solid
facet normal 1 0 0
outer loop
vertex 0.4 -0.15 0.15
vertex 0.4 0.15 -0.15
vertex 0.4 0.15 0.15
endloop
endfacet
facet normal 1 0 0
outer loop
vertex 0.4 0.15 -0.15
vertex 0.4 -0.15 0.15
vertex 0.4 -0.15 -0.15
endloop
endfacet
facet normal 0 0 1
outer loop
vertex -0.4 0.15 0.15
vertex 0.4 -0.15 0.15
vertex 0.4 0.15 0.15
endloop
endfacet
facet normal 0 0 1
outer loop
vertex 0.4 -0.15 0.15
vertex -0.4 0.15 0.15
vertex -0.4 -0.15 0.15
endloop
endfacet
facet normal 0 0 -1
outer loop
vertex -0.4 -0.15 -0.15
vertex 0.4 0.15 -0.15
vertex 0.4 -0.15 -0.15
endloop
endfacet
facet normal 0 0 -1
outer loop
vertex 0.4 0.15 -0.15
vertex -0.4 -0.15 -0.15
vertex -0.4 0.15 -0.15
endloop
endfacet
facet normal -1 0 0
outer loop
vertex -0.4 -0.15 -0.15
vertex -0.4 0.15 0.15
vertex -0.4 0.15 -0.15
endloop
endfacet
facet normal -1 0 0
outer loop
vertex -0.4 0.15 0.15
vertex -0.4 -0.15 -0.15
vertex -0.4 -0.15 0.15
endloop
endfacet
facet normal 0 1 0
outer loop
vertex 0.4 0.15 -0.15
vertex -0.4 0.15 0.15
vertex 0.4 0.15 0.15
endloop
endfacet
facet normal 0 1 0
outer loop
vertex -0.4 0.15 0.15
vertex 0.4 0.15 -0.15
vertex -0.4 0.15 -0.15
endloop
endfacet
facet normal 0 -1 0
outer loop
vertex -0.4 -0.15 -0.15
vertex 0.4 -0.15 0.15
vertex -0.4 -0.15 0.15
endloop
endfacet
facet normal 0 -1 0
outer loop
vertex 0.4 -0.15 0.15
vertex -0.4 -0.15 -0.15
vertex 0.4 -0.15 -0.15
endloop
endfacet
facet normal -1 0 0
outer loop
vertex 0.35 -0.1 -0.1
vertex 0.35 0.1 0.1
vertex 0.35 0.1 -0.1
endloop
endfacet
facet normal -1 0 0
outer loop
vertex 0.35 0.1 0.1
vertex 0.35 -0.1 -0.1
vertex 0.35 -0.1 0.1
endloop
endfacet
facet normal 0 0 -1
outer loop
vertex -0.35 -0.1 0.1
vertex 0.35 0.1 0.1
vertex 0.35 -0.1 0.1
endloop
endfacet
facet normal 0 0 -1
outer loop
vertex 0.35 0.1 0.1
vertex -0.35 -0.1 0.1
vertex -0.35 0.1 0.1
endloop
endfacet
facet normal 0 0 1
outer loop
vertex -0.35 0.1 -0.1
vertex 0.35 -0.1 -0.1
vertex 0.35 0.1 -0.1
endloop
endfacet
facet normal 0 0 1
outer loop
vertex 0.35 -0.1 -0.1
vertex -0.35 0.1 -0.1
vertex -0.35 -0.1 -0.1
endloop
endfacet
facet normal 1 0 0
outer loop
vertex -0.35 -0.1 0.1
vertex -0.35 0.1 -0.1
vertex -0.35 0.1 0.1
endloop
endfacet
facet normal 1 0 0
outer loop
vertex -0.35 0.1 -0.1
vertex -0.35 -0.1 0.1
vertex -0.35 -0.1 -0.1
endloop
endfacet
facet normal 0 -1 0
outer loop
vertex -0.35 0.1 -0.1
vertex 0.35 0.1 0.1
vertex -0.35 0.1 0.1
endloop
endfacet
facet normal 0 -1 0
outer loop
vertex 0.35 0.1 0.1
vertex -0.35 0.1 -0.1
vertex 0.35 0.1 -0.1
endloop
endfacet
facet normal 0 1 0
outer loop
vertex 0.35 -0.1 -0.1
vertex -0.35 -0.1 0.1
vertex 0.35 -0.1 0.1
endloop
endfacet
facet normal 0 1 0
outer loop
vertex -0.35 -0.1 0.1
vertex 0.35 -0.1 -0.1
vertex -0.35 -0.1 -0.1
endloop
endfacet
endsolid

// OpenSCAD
module rectangular_tube() {
    outer_length = 0.8;
    outer_width = 0.3;
    outer_height = 0.3;
    wall_thickness = 0.05;
    
    inner_length = outer_length - 2 * wall_thickness;
    inner_width = outer_width - 2 * wall_thickness;
    inner_height = outer_height - 2 * wall_thickness;
    
    difference() {
        cube([outer_length, outer_width, outer_height], center = true);
        translate([0, 0, 0])
            cube([inner_length, inner_width, inner_height], center = true);
    }
}

rectangular_tube();
